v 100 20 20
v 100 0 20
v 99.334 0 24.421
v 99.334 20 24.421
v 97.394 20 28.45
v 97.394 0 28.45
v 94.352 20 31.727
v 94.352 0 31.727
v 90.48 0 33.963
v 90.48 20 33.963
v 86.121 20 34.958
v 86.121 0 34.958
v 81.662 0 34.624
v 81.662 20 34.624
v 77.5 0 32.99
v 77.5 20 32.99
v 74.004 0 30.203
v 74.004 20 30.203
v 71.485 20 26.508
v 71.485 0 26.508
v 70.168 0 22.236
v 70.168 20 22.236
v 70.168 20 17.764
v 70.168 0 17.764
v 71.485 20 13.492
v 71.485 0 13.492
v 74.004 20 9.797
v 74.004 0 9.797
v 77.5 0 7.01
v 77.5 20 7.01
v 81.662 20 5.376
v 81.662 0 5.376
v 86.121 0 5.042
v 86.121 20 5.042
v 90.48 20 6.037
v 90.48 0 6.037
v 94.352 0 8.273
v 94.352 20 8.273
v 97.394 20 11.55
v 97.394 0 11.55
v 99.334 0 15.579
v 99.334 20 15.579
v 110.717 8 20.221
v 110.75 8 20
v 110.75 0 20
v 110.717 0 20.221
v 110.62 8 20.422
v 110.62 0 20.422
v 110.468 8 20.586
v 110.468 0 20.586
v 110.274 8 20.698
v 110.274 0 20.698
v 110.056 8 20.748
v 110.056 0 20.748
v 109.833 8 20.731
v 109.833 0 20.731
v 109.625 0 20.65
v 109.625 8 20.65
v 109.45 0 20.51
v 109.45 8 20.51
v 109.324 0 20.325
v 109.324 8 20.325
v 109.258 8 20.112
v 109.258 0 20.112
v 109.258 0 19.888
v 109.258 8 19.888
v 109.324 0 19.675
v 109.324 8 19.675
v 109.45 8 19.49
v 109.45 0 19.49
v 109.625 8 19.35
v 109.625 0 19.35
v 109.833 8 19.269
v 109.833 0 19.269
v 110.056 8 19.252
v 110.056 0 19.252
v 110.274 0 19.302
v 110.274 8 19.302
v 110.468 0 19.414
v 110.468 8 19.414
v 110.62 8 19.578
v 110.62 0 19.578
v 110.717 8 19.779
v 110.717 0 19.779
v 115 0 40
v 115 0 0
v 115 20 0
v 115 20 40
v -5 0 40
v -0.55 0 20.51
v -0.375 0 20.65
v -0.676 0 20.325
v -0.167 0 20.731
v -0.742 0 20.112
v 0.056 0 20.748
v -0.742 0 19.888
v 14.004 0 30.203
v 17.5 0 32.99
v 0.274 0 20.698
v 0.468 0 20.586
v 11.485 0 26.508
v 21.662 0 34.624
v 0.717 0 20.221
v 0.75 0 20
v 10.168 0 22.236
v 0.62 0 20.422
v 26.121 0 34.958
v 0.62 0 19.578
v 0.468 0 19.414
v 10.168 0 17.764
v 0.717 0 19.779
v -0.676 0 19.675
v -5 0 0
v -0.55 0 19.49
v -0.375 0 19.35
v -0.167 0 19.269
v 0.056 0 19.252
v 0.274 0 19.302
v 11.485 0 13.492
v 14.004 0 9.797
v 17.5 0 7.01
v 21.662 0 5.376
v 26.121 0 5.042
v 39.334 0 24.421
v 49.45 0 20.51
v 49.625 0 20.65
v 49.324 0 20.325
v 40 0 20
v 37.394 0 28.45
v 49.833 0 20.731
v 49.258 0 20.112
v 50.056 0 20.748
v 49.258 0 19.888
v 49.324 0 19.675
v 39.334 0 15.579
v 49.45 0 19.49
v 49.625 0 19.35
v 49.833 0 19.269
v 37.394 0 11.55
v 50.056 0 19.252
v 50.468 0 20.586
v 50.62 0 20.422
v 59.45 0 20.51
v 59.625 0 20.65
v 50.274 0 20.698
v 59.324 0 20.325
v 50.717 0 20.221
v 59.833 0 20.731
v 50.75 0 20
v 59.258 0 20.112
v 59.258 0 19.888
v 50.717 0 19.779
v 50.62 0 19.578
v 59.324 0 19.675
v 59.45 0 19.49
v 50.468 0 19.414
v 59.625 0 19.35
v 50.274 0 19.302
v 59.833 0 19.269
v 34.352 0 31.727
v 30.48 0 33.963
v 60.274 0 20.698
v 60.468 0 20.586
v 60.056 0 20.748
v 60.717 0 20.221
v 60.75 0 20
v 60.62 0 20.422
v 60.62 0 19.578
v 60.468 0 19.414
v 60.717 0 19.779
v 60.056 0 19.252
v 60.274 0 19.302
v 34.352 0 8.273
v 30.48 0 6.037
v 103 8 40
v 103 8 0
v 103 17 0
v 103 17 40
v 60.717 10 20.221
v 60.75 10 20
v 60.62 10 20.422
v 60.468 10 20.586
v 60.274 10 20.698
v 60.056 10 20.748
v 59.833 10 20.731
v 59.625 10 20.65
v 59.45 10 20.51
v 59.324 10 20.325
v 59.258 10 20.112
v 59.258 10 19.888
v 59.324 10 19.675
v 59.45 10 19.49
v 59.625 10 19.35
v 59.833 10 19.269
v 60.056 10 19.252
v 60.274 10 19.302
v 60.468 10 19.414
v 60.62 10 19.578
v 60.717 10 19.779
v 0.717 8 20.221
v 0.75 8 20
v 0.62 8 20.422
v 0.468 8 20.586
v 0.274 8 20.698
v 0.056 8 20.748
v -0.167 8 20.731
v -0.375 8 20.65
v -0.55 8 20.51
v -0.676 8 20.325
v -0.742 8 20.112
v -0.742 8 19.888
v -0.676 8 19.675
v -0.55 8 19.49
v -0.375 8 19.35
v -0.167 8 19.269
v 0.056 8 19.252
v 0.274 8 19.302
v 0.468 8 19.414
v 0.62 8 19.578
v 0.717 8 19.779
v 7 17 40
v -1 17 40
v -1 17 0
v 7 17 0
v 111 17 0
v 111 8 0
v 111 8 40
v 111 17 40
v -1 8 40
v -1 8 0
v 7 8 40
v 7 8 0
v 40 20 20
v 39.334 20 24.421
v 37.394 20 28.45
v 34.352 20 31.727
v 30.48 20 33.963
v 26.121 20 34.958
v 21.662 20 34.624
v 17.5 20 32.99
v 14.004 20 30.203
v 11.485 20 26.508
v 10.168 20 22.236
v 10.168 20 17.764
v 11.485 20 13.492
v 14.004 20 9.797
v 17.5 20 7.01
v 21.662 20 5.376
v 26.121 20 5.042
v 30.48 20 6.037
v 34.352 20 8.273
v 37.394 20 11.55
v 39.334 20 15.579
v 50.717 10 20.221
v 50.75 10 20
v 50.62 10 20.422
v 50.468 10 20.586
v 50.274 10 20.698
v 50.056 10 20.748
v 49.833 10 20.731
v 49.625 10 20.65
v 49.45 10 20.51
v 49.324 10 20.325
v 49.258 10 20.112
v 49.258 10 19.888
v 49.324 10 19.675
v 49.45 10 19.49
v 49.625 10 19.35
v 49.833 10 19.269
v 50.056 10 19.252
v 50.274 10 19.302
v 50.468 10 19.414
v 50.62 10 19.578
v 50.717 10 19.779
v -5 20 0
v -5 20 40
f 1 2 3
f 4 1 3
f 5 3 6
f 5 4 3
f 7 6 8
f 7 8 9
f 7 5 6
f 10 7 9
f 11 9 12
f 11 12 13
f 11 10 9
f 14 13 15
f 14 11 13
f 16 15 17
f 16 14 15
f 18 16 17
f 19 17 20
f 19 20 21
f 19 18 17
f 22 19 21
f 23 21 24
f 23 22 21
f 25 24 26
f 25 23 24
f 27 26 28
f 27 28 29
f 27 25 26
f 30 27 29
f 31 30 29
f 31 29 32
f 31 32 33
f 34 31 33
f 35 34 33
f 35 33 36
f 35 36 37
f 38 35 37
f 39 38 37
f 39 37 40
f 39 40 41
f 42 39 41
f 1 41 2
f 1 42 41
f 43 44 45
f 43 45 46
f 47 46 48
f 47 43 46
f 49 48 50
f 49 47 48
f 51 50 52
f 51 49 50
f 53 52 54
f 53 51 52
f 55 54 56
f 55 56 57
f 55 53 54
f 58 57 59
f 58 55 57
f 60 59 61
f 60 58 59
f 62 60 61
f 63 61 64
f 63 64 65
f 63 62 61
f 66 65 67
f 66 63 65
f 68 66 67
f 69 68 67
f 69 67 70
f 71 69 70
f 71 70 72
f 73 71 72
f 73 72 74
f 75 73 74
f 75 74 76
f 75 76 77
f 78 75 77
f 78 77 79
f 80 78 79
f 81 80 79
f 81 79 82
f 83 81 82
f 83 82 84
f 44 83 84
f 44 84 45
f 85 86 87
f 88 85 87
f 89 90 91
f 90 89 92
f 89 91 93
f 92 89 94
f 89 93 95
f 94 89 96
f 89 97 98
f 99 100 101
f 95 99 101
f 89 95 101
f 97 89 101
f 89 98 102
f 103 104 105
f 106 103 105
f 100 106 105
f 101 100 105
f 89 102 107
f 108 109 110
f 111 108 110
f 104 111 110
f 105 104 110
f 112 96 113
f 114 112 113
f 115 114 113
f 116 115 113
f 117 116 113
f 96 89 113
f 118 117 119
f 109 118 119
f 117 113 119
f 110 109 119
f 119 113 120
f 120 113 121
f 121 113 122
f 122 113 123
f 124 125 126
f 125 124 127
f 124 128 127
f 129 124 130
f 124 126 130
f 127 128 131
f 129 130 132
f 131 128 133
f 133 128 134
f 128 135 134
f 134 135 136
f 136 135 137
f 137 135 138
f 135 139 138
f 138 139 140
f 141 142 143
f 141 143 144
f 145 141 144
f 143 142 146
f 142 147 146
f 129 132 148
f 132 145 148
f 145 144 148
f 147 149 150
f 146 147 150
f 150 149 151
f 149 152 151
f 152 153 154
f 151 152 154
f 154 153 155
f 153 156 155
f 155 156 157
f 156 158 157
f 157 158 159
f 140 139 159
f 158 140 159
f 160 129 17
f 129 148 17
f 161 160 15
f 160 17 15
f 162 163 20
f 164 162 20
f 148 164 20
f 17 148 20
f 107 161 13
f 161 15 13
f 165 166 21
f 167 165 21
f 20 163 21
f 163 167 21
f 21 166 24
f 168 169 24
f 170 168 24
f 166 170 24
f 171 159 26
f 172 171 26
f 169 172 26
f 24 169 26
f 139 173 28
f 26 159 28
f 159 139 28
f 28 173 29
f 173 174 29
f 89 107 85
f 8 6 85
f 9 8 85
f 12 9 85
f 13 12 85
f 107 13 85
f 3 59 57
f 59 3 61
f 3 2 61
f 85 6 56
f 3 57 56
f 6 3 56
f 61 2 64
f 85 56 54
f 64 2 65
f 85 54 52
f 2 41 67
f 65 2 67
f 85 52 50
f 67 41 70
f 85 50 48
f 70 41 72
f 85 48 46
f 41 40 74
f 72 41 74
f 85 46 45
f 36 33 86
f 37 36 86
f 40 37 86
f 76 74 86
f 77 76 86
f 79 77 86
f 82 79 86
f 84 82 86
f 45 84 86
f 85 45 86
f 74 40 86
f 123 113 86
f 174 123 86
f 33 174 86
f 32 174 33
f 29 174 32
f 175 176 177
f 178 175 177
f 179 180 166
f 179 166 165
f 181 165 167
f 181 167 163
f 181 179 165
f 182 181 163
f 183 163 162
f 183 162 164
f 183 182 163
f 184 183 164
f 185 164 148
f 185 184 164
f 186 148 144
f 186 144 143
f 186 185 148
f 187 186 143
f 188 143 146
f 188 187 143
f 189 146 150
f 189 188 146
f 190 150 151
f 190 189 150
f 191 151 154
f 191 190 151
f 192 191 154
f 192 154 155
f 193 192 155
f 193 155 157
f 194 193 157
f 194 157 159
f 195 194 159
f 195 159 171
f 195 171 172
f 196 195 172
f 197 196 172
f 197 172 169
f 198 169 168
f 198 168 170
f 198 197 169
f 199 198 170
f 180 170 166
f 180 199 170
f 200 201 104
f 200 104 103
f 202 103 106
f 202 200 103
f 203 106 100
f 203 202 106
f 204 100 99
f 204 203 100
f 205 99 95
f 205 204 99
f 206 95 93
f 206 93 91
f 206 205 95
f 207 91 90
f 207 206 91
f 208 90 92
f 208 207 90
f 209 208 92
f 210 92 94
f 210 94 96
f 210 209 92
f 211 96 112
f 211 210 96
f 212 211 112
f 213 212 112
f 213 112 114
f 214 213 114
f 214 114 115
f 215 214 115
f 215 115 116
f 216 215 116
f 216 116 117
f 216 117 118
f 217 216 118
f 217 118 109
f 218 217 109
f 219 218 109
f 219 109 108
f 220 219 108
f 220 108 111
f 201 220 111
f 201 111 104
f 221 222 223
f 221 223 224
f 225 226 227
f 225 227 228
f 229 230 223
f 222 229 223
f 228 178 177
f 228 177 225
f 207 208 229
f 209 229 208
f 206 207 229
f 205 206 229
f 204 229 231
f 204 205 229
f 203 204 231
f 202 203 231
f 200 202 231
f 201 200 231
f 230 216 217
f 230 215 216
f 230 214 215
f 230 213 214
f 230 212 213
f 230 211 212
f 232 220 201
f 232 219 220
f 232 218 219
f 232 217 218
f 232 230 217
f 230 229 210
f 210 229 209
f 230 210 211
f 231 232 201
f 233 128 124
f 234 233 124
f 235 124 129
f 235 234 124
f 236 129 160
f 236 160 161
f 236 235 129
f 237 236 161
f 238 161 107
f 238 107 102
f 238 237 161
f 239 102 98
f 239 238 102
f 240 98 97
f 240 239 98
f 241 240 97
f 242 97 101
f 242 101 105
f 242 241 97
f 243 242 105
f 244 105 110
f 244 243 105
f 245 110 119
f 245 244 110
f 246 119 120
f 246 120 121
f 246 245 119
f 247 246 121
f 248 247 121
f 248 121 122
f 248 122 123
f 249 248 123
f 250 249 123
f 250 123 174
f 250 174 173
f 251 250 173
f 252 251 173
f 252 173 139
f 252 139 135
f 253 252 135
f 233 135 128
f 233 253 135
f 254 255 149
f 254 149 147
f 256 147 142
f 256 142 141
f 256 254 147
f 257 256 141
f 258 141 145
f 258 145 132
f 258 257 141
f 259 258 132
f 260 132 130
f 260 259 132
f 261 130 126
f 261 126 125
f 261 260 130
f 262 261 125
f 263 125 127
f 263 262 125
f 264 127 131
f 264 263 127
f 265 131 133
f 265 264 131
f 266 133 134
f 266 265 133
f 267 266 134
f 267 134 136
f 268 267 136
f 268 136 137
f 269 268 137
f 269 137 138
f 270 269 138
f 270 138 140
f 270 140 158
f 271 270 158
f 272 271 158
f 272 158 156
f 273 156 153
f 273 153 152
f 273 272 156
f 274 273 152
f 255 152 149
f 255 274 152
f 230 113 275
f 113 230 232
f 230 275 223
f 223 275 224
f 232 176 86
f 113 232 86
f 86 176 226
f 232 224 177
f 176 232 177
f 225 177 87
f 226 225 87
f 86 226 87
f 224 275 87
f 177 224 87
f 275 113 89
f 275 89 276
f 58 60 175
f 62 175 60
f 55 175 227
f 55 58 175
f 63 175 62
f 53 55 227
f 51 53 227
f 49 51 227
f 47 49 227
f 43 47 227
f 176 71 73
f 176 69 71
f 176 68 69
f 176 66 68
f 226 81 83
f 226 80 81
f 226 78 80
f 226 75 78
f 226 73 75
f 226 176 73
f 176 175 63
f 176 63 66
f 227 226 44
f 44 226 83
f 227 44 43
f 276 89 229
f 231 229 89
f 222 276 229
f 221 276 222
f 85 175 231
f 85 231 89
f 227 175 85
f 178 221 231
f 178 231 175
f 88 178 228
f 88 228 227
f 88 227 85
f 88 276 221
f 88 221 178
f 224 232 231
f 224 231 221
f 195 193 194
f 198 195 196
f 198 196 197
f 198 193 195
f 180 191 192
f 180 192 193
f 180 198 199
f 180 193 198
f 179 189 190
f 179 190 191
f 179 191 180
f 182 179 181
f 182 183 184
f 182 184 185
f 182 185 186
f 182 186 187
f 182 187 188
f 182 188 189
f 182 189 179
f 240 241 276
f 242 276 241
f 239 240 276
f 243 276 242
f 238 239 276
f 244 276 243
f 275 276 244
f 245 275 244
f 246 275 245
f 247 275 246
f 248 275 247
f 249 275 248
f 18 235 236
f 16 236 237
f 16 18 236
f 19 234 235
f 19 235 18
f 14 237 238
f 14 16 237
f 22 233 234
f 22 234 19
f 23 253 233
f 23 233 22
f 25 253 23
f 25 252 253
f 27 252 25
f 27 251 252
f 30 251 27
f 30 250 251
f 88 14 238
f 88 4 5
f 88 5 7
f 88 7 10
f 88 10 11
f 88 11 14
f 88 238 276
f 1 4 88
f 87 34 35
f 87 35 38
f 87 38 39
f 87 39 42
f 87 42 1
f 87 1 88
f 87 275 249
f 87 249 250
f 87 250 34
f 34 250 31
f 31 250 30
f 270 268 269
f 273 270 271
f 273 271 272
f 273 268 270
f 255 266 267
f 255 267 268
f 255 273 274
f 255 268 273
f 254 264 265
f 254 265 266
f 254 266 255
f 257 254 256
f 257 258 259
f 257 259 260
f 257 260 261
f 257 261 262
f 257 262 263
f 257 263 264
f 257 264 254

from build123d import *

# Parameters (mm, degrees)
CYLINDER001_R          = 0.75
CYLINDER001_DEPTH      = 10
CYLINDER001_ROLL_ANGLE = 90
CYLINDER002_R          = 0.75
CYLINDER002_DEPTH      = 10
CYLINDER002_ROLL_ANGLE = 90
CYLINDER_R             = 15
CYLINDER_DEPTH         = 20
CYLINDER_ROLL_ANGLE    = 90
BOX001_W               = 8
BOX001_H               = 9
BOX001_DEPTH           = 40
BOX002_W               = 8
BOX002_H               = 9
BOX002_DEPTH           = 40
BOX_W                  = 120
BOX_H                  = 20
BOX_DEPTH              = 40


with BuildPart() as zylinder001:
    # Cylinder001 → Cylinder001 (new body)
    with BuildSketch(Plane.XY):
        Circle(CYLINDER001_R)
    extrude(amount=CYLINDER001_DEPTH)


with BuildPart() as zylinder001_1:
    # Cylinder001 roll: moved
    add(zylinder001.part.rotate(Axis((0, 0, 0), (1, 0, 0)), CYLINDER001_ROLL_ANGLE))


with BuildPart() as zylinder001_2:
    # Cylinder001 placement: moved
    add(zylinder001_1.part.moved(Location((0, 10, 20))))


with BuildPart() as zylinder002:
    # Cylinder002 → Cylinder002 (new body)
    with BuildSketch(Plane.XY):
        Circle(CYLINDER002_R)
    extrude(amount=CYLINDER002_DEPTH)


with BuildPart() as zylinder002_1:
    # Cylinder002 roll: moved
    add(zylinder002.part.rotate(Axis((0, 0, 0), (1, 0, 0)), CYLINDER002_ROLL_ANGLE))


with BuildPart() as zylinder002_2:
    # Cylinder002 placement: moved
    add(zylinder002_1.part.moved(Location((50, 10, 20))))


with BuildPart() as zylinder:
    # Cylinder → Cylinder (new body)
    with BuildSketch(Plane.XY):
        Circle(CYLINDER_R)
    extrude(amount=CYLINDER_DEPTH)


with BuildPart() as zylinder_1:
    # Cylinder roll: moved
    add(zylinder.part.rotate(Axis((0, 0, 0), (1, 0, 0)), CYLINDER_ROLL_ANGLE))


with BuildPart() as zylinder_2:
    # Cylinder placement: moved
    add(zylinder_1.part.moved(Location((25, 20, 20))))


with BuildPart() as fusion001:
    # Fusion001 base: copy of Zylinder
    add(zylinder_2.part)

    # Fusion001: union Zylinder001, Zylinder002
    add(zylinder001_2.part)
    add(zylinder002_2.part)


with BuildPart() as cube001:
    # Box001 → Box001 (new body)
    with BuildSketch(Plane(origin=(-1, 8, 0), x_dir=(1, 0, 0), z_dir=(0, 0, 1))):
        with Locations((4, 4.5)):
            Rectangle(BOX001_W, BOX001_H)
    extrude(amount=BOX001_DEPTH)


with BuildPart() as cube002:
    # Box002 → Box002 (new body)
    with BuildSketch(Plane(origin=(103, 8, 0), x_dir=(1, 0, 0), z_dir=(0, 0, 1))):
        with Locations((4, 4.5)):
            Rectangle(BOX002_W, BOX002_H)
    extrude(amount=BOX002_DEPTH)


with BuildPart() as fusion002:
    # Fusion base: copy of Zylinder
    add(zylinder_2.part)

    # Fusion: union Zylinder001, Zylinder002
    add(zylinder001_2.part)
    add(zylinder002_2.part)


with BuildPart() as fusion002_1:
    # Fusion placement: moved
    add(fusion002.part.moved(Location((60, 0, 0))))

    # Fusion002: union Fusion001, Cube001, Cube002
    add(fusion001.part)
    add(cube001.part)
    add(cube002.part)


with BuildPart() as motorhalterung:
    # Box → Box (new body)
    with BuildSketch(Plane(origin=(-5, 0, 0), x_dir=(1, 0, 0), z_dir=(0, 0, 1))):
        with Locations((60, 10)):
            Rectangle(BOX_W, BOX_H)
    extrude(amount=BOX_DEPTH)

    # Cut: cut Fusion002
    add(fusion002_1.part, mode=Mode.SUBTRACT)


solid = motorhalterung.part
